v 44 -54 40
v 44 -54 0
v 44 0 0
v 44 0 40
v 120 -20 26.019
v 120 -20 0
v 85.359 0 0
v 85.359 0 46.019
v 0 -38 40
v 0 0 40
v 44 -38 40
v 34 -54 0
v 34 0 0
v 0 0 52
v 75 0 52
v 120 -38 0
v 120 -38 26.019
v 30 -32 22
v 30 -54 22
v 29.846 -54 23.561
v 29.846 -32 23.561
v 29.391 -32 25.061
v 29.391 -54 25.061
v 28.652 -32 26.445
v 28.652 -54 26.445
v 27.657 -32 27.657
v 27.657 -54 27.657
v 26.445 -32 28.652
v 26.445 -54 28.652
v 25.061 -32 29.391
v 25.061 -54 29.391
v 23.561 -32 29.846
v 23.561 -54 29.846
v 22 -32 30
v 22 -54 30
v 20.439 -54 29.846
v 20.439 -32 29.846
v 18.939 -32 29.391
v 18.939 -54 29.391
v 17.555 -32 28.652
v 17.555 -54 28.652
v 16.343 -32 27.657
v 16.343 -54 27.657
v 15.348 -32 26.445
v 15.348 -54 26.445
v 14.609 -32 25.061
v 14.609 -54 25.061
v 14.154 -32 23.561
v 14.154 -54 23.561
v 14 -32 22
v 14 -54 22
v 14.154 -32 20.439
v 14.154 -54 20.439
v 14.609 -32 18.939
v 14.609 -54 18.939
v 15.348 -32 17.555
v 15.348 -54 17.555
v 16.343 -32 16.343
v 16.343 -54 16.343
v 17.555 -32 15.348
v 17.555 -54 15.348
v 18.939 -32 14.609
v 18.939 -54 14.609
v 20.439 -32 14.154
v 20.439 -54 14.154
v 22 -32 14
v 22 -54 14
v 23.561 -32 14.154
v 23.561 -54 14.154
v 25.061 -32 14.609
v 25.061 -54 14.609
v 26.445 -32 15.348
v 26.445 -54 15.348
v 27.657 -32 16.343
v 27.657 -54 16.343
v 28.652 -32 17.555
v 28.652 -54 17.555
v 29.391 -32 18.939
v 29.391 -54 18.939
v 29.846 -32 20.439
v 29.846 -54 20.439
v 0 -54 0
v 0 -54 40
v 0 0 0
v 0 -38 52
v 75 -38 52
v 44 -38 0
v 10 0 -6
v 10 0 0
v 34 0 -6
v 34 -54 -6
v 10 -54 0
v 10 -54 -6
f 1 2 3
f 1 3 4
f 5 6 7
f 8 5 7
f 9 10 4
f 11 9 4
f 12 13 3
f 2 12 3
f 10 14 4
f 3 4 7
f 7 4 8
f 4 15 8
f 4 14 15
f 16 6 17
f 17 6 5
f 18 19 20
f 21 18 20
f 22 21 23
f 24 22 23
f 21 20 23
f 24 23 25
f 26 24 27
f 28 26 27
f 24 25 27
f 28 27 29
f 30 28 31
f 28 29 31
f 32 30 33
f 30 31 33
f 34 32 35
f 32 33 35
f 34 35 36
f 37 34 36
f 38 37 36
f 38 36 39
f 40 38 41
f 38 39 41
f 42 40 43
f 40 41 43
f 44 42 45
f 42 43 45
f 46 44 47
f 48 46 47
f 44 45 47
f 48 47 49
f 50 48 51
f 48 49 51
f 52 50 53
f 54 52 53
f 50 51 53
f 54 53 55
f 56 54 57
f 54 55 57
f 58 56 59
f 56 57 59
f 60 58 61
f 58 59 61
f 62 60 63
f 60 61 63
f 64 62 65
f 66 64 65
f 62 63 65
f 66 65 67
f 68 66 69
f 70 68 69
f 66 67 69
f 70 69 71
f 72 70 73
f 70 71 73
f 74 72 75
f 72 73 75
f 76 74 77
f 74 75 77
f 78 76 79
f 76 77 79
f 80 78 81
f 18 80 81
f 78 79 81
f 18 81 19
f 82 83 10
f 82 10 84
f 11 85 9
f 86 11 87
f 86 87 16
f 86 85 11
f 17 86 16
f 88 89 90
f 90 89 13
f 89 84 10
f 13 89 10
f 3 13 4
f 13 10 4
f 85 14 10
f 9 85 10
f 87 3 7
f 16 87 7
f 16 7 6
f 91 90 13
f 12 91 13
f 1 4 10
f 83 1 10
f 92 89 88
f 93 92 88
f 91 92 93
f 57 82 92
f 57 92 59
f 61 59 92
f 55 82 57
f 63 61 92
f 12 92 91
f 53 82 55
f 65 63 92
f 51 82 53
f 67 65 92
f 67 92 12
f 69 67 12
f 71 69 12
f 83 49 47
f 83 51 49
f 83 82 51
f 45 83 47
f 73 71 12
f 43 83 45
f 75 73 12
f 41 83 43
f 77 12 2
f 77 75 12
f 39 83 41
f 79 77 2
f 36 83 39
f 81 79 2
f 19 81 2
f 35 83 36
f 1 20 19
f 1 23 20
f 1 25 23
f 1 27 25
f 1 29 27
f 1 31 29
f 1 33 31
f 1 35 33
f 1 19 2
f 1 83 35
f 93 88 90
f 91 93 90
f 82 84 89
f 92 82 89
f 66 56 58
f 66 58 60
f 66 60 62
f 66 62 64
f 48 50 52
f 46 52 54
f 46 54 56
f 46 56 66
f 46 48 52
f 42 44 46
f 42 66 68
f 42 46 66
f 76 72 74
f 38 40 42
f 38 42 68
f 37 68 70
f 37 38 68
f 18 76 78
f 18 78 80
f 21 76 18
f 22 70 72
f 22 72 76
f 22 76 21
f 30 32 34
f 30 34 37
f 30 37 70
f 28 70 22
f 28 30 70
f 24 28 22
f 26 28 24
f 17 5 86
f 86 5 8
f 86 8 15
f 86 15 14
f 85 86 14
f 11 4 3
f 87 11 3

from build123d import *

# Parameters (mm, degrees)
F1_DEPTH = 38
F0_R     = 8
F2_DEPTH = 54
F4_DEPTH = 52.001
F5_R     = 8
F6_DEPTH = 22


with BuildPart() as f1:
    # F0 (on Front) → F1 (new body)
    with BuildSketch(Plane.XZ):
        Polygon((120, 26.0192378865), (75, 52), (75, 0), (120, 0), align=None)
        Polygon((0, 52), (0, 40), (44, 40), (44, 0), (75, 0), (75, 52), align=None)
    extrude(amount=F1_DEPTH)

    # F3 (on face) → F4 (cut, through all)
    with BuildSketch(Plane(origin=(0, 0, 0), x_dir=(1, 0, 0), z_dir=(0, 0, -1))):
        Polygon((85.3589838486, 0), (120, 0), (120, 20), align=None)
    extrude(amount=-F4_DEPTH, mode=Mode.SUBTRACT)


with BuildPart() as f2:
    # F0 (on Front) → F2 (new body)
    with BuildSketch(Plane.XZ):
        Polygon((0, 40), (0, 0), (10, 0), (10, -6), (34, -6), (34, 0), (44, 0), (44, 40), align=None)
        with Locations((22, 22)):
            Circle(F0_R, mode=Mode.SUBTRACT)
        with Locations((22, 22)):
            Circle(F0_R)
    extrude(amount=F2_DEPTH)

    # F5 (on face) → F6 (cut)
    with BuildSketch(Plane.XZ.offset(54)):
        with Locations((22, 22)):
            Circle(F5_R)
    extrude(amount=-F6_DEPTH, mode=Mode.SUBTRACT)


solid = Compound([f1.part, f2.part])
